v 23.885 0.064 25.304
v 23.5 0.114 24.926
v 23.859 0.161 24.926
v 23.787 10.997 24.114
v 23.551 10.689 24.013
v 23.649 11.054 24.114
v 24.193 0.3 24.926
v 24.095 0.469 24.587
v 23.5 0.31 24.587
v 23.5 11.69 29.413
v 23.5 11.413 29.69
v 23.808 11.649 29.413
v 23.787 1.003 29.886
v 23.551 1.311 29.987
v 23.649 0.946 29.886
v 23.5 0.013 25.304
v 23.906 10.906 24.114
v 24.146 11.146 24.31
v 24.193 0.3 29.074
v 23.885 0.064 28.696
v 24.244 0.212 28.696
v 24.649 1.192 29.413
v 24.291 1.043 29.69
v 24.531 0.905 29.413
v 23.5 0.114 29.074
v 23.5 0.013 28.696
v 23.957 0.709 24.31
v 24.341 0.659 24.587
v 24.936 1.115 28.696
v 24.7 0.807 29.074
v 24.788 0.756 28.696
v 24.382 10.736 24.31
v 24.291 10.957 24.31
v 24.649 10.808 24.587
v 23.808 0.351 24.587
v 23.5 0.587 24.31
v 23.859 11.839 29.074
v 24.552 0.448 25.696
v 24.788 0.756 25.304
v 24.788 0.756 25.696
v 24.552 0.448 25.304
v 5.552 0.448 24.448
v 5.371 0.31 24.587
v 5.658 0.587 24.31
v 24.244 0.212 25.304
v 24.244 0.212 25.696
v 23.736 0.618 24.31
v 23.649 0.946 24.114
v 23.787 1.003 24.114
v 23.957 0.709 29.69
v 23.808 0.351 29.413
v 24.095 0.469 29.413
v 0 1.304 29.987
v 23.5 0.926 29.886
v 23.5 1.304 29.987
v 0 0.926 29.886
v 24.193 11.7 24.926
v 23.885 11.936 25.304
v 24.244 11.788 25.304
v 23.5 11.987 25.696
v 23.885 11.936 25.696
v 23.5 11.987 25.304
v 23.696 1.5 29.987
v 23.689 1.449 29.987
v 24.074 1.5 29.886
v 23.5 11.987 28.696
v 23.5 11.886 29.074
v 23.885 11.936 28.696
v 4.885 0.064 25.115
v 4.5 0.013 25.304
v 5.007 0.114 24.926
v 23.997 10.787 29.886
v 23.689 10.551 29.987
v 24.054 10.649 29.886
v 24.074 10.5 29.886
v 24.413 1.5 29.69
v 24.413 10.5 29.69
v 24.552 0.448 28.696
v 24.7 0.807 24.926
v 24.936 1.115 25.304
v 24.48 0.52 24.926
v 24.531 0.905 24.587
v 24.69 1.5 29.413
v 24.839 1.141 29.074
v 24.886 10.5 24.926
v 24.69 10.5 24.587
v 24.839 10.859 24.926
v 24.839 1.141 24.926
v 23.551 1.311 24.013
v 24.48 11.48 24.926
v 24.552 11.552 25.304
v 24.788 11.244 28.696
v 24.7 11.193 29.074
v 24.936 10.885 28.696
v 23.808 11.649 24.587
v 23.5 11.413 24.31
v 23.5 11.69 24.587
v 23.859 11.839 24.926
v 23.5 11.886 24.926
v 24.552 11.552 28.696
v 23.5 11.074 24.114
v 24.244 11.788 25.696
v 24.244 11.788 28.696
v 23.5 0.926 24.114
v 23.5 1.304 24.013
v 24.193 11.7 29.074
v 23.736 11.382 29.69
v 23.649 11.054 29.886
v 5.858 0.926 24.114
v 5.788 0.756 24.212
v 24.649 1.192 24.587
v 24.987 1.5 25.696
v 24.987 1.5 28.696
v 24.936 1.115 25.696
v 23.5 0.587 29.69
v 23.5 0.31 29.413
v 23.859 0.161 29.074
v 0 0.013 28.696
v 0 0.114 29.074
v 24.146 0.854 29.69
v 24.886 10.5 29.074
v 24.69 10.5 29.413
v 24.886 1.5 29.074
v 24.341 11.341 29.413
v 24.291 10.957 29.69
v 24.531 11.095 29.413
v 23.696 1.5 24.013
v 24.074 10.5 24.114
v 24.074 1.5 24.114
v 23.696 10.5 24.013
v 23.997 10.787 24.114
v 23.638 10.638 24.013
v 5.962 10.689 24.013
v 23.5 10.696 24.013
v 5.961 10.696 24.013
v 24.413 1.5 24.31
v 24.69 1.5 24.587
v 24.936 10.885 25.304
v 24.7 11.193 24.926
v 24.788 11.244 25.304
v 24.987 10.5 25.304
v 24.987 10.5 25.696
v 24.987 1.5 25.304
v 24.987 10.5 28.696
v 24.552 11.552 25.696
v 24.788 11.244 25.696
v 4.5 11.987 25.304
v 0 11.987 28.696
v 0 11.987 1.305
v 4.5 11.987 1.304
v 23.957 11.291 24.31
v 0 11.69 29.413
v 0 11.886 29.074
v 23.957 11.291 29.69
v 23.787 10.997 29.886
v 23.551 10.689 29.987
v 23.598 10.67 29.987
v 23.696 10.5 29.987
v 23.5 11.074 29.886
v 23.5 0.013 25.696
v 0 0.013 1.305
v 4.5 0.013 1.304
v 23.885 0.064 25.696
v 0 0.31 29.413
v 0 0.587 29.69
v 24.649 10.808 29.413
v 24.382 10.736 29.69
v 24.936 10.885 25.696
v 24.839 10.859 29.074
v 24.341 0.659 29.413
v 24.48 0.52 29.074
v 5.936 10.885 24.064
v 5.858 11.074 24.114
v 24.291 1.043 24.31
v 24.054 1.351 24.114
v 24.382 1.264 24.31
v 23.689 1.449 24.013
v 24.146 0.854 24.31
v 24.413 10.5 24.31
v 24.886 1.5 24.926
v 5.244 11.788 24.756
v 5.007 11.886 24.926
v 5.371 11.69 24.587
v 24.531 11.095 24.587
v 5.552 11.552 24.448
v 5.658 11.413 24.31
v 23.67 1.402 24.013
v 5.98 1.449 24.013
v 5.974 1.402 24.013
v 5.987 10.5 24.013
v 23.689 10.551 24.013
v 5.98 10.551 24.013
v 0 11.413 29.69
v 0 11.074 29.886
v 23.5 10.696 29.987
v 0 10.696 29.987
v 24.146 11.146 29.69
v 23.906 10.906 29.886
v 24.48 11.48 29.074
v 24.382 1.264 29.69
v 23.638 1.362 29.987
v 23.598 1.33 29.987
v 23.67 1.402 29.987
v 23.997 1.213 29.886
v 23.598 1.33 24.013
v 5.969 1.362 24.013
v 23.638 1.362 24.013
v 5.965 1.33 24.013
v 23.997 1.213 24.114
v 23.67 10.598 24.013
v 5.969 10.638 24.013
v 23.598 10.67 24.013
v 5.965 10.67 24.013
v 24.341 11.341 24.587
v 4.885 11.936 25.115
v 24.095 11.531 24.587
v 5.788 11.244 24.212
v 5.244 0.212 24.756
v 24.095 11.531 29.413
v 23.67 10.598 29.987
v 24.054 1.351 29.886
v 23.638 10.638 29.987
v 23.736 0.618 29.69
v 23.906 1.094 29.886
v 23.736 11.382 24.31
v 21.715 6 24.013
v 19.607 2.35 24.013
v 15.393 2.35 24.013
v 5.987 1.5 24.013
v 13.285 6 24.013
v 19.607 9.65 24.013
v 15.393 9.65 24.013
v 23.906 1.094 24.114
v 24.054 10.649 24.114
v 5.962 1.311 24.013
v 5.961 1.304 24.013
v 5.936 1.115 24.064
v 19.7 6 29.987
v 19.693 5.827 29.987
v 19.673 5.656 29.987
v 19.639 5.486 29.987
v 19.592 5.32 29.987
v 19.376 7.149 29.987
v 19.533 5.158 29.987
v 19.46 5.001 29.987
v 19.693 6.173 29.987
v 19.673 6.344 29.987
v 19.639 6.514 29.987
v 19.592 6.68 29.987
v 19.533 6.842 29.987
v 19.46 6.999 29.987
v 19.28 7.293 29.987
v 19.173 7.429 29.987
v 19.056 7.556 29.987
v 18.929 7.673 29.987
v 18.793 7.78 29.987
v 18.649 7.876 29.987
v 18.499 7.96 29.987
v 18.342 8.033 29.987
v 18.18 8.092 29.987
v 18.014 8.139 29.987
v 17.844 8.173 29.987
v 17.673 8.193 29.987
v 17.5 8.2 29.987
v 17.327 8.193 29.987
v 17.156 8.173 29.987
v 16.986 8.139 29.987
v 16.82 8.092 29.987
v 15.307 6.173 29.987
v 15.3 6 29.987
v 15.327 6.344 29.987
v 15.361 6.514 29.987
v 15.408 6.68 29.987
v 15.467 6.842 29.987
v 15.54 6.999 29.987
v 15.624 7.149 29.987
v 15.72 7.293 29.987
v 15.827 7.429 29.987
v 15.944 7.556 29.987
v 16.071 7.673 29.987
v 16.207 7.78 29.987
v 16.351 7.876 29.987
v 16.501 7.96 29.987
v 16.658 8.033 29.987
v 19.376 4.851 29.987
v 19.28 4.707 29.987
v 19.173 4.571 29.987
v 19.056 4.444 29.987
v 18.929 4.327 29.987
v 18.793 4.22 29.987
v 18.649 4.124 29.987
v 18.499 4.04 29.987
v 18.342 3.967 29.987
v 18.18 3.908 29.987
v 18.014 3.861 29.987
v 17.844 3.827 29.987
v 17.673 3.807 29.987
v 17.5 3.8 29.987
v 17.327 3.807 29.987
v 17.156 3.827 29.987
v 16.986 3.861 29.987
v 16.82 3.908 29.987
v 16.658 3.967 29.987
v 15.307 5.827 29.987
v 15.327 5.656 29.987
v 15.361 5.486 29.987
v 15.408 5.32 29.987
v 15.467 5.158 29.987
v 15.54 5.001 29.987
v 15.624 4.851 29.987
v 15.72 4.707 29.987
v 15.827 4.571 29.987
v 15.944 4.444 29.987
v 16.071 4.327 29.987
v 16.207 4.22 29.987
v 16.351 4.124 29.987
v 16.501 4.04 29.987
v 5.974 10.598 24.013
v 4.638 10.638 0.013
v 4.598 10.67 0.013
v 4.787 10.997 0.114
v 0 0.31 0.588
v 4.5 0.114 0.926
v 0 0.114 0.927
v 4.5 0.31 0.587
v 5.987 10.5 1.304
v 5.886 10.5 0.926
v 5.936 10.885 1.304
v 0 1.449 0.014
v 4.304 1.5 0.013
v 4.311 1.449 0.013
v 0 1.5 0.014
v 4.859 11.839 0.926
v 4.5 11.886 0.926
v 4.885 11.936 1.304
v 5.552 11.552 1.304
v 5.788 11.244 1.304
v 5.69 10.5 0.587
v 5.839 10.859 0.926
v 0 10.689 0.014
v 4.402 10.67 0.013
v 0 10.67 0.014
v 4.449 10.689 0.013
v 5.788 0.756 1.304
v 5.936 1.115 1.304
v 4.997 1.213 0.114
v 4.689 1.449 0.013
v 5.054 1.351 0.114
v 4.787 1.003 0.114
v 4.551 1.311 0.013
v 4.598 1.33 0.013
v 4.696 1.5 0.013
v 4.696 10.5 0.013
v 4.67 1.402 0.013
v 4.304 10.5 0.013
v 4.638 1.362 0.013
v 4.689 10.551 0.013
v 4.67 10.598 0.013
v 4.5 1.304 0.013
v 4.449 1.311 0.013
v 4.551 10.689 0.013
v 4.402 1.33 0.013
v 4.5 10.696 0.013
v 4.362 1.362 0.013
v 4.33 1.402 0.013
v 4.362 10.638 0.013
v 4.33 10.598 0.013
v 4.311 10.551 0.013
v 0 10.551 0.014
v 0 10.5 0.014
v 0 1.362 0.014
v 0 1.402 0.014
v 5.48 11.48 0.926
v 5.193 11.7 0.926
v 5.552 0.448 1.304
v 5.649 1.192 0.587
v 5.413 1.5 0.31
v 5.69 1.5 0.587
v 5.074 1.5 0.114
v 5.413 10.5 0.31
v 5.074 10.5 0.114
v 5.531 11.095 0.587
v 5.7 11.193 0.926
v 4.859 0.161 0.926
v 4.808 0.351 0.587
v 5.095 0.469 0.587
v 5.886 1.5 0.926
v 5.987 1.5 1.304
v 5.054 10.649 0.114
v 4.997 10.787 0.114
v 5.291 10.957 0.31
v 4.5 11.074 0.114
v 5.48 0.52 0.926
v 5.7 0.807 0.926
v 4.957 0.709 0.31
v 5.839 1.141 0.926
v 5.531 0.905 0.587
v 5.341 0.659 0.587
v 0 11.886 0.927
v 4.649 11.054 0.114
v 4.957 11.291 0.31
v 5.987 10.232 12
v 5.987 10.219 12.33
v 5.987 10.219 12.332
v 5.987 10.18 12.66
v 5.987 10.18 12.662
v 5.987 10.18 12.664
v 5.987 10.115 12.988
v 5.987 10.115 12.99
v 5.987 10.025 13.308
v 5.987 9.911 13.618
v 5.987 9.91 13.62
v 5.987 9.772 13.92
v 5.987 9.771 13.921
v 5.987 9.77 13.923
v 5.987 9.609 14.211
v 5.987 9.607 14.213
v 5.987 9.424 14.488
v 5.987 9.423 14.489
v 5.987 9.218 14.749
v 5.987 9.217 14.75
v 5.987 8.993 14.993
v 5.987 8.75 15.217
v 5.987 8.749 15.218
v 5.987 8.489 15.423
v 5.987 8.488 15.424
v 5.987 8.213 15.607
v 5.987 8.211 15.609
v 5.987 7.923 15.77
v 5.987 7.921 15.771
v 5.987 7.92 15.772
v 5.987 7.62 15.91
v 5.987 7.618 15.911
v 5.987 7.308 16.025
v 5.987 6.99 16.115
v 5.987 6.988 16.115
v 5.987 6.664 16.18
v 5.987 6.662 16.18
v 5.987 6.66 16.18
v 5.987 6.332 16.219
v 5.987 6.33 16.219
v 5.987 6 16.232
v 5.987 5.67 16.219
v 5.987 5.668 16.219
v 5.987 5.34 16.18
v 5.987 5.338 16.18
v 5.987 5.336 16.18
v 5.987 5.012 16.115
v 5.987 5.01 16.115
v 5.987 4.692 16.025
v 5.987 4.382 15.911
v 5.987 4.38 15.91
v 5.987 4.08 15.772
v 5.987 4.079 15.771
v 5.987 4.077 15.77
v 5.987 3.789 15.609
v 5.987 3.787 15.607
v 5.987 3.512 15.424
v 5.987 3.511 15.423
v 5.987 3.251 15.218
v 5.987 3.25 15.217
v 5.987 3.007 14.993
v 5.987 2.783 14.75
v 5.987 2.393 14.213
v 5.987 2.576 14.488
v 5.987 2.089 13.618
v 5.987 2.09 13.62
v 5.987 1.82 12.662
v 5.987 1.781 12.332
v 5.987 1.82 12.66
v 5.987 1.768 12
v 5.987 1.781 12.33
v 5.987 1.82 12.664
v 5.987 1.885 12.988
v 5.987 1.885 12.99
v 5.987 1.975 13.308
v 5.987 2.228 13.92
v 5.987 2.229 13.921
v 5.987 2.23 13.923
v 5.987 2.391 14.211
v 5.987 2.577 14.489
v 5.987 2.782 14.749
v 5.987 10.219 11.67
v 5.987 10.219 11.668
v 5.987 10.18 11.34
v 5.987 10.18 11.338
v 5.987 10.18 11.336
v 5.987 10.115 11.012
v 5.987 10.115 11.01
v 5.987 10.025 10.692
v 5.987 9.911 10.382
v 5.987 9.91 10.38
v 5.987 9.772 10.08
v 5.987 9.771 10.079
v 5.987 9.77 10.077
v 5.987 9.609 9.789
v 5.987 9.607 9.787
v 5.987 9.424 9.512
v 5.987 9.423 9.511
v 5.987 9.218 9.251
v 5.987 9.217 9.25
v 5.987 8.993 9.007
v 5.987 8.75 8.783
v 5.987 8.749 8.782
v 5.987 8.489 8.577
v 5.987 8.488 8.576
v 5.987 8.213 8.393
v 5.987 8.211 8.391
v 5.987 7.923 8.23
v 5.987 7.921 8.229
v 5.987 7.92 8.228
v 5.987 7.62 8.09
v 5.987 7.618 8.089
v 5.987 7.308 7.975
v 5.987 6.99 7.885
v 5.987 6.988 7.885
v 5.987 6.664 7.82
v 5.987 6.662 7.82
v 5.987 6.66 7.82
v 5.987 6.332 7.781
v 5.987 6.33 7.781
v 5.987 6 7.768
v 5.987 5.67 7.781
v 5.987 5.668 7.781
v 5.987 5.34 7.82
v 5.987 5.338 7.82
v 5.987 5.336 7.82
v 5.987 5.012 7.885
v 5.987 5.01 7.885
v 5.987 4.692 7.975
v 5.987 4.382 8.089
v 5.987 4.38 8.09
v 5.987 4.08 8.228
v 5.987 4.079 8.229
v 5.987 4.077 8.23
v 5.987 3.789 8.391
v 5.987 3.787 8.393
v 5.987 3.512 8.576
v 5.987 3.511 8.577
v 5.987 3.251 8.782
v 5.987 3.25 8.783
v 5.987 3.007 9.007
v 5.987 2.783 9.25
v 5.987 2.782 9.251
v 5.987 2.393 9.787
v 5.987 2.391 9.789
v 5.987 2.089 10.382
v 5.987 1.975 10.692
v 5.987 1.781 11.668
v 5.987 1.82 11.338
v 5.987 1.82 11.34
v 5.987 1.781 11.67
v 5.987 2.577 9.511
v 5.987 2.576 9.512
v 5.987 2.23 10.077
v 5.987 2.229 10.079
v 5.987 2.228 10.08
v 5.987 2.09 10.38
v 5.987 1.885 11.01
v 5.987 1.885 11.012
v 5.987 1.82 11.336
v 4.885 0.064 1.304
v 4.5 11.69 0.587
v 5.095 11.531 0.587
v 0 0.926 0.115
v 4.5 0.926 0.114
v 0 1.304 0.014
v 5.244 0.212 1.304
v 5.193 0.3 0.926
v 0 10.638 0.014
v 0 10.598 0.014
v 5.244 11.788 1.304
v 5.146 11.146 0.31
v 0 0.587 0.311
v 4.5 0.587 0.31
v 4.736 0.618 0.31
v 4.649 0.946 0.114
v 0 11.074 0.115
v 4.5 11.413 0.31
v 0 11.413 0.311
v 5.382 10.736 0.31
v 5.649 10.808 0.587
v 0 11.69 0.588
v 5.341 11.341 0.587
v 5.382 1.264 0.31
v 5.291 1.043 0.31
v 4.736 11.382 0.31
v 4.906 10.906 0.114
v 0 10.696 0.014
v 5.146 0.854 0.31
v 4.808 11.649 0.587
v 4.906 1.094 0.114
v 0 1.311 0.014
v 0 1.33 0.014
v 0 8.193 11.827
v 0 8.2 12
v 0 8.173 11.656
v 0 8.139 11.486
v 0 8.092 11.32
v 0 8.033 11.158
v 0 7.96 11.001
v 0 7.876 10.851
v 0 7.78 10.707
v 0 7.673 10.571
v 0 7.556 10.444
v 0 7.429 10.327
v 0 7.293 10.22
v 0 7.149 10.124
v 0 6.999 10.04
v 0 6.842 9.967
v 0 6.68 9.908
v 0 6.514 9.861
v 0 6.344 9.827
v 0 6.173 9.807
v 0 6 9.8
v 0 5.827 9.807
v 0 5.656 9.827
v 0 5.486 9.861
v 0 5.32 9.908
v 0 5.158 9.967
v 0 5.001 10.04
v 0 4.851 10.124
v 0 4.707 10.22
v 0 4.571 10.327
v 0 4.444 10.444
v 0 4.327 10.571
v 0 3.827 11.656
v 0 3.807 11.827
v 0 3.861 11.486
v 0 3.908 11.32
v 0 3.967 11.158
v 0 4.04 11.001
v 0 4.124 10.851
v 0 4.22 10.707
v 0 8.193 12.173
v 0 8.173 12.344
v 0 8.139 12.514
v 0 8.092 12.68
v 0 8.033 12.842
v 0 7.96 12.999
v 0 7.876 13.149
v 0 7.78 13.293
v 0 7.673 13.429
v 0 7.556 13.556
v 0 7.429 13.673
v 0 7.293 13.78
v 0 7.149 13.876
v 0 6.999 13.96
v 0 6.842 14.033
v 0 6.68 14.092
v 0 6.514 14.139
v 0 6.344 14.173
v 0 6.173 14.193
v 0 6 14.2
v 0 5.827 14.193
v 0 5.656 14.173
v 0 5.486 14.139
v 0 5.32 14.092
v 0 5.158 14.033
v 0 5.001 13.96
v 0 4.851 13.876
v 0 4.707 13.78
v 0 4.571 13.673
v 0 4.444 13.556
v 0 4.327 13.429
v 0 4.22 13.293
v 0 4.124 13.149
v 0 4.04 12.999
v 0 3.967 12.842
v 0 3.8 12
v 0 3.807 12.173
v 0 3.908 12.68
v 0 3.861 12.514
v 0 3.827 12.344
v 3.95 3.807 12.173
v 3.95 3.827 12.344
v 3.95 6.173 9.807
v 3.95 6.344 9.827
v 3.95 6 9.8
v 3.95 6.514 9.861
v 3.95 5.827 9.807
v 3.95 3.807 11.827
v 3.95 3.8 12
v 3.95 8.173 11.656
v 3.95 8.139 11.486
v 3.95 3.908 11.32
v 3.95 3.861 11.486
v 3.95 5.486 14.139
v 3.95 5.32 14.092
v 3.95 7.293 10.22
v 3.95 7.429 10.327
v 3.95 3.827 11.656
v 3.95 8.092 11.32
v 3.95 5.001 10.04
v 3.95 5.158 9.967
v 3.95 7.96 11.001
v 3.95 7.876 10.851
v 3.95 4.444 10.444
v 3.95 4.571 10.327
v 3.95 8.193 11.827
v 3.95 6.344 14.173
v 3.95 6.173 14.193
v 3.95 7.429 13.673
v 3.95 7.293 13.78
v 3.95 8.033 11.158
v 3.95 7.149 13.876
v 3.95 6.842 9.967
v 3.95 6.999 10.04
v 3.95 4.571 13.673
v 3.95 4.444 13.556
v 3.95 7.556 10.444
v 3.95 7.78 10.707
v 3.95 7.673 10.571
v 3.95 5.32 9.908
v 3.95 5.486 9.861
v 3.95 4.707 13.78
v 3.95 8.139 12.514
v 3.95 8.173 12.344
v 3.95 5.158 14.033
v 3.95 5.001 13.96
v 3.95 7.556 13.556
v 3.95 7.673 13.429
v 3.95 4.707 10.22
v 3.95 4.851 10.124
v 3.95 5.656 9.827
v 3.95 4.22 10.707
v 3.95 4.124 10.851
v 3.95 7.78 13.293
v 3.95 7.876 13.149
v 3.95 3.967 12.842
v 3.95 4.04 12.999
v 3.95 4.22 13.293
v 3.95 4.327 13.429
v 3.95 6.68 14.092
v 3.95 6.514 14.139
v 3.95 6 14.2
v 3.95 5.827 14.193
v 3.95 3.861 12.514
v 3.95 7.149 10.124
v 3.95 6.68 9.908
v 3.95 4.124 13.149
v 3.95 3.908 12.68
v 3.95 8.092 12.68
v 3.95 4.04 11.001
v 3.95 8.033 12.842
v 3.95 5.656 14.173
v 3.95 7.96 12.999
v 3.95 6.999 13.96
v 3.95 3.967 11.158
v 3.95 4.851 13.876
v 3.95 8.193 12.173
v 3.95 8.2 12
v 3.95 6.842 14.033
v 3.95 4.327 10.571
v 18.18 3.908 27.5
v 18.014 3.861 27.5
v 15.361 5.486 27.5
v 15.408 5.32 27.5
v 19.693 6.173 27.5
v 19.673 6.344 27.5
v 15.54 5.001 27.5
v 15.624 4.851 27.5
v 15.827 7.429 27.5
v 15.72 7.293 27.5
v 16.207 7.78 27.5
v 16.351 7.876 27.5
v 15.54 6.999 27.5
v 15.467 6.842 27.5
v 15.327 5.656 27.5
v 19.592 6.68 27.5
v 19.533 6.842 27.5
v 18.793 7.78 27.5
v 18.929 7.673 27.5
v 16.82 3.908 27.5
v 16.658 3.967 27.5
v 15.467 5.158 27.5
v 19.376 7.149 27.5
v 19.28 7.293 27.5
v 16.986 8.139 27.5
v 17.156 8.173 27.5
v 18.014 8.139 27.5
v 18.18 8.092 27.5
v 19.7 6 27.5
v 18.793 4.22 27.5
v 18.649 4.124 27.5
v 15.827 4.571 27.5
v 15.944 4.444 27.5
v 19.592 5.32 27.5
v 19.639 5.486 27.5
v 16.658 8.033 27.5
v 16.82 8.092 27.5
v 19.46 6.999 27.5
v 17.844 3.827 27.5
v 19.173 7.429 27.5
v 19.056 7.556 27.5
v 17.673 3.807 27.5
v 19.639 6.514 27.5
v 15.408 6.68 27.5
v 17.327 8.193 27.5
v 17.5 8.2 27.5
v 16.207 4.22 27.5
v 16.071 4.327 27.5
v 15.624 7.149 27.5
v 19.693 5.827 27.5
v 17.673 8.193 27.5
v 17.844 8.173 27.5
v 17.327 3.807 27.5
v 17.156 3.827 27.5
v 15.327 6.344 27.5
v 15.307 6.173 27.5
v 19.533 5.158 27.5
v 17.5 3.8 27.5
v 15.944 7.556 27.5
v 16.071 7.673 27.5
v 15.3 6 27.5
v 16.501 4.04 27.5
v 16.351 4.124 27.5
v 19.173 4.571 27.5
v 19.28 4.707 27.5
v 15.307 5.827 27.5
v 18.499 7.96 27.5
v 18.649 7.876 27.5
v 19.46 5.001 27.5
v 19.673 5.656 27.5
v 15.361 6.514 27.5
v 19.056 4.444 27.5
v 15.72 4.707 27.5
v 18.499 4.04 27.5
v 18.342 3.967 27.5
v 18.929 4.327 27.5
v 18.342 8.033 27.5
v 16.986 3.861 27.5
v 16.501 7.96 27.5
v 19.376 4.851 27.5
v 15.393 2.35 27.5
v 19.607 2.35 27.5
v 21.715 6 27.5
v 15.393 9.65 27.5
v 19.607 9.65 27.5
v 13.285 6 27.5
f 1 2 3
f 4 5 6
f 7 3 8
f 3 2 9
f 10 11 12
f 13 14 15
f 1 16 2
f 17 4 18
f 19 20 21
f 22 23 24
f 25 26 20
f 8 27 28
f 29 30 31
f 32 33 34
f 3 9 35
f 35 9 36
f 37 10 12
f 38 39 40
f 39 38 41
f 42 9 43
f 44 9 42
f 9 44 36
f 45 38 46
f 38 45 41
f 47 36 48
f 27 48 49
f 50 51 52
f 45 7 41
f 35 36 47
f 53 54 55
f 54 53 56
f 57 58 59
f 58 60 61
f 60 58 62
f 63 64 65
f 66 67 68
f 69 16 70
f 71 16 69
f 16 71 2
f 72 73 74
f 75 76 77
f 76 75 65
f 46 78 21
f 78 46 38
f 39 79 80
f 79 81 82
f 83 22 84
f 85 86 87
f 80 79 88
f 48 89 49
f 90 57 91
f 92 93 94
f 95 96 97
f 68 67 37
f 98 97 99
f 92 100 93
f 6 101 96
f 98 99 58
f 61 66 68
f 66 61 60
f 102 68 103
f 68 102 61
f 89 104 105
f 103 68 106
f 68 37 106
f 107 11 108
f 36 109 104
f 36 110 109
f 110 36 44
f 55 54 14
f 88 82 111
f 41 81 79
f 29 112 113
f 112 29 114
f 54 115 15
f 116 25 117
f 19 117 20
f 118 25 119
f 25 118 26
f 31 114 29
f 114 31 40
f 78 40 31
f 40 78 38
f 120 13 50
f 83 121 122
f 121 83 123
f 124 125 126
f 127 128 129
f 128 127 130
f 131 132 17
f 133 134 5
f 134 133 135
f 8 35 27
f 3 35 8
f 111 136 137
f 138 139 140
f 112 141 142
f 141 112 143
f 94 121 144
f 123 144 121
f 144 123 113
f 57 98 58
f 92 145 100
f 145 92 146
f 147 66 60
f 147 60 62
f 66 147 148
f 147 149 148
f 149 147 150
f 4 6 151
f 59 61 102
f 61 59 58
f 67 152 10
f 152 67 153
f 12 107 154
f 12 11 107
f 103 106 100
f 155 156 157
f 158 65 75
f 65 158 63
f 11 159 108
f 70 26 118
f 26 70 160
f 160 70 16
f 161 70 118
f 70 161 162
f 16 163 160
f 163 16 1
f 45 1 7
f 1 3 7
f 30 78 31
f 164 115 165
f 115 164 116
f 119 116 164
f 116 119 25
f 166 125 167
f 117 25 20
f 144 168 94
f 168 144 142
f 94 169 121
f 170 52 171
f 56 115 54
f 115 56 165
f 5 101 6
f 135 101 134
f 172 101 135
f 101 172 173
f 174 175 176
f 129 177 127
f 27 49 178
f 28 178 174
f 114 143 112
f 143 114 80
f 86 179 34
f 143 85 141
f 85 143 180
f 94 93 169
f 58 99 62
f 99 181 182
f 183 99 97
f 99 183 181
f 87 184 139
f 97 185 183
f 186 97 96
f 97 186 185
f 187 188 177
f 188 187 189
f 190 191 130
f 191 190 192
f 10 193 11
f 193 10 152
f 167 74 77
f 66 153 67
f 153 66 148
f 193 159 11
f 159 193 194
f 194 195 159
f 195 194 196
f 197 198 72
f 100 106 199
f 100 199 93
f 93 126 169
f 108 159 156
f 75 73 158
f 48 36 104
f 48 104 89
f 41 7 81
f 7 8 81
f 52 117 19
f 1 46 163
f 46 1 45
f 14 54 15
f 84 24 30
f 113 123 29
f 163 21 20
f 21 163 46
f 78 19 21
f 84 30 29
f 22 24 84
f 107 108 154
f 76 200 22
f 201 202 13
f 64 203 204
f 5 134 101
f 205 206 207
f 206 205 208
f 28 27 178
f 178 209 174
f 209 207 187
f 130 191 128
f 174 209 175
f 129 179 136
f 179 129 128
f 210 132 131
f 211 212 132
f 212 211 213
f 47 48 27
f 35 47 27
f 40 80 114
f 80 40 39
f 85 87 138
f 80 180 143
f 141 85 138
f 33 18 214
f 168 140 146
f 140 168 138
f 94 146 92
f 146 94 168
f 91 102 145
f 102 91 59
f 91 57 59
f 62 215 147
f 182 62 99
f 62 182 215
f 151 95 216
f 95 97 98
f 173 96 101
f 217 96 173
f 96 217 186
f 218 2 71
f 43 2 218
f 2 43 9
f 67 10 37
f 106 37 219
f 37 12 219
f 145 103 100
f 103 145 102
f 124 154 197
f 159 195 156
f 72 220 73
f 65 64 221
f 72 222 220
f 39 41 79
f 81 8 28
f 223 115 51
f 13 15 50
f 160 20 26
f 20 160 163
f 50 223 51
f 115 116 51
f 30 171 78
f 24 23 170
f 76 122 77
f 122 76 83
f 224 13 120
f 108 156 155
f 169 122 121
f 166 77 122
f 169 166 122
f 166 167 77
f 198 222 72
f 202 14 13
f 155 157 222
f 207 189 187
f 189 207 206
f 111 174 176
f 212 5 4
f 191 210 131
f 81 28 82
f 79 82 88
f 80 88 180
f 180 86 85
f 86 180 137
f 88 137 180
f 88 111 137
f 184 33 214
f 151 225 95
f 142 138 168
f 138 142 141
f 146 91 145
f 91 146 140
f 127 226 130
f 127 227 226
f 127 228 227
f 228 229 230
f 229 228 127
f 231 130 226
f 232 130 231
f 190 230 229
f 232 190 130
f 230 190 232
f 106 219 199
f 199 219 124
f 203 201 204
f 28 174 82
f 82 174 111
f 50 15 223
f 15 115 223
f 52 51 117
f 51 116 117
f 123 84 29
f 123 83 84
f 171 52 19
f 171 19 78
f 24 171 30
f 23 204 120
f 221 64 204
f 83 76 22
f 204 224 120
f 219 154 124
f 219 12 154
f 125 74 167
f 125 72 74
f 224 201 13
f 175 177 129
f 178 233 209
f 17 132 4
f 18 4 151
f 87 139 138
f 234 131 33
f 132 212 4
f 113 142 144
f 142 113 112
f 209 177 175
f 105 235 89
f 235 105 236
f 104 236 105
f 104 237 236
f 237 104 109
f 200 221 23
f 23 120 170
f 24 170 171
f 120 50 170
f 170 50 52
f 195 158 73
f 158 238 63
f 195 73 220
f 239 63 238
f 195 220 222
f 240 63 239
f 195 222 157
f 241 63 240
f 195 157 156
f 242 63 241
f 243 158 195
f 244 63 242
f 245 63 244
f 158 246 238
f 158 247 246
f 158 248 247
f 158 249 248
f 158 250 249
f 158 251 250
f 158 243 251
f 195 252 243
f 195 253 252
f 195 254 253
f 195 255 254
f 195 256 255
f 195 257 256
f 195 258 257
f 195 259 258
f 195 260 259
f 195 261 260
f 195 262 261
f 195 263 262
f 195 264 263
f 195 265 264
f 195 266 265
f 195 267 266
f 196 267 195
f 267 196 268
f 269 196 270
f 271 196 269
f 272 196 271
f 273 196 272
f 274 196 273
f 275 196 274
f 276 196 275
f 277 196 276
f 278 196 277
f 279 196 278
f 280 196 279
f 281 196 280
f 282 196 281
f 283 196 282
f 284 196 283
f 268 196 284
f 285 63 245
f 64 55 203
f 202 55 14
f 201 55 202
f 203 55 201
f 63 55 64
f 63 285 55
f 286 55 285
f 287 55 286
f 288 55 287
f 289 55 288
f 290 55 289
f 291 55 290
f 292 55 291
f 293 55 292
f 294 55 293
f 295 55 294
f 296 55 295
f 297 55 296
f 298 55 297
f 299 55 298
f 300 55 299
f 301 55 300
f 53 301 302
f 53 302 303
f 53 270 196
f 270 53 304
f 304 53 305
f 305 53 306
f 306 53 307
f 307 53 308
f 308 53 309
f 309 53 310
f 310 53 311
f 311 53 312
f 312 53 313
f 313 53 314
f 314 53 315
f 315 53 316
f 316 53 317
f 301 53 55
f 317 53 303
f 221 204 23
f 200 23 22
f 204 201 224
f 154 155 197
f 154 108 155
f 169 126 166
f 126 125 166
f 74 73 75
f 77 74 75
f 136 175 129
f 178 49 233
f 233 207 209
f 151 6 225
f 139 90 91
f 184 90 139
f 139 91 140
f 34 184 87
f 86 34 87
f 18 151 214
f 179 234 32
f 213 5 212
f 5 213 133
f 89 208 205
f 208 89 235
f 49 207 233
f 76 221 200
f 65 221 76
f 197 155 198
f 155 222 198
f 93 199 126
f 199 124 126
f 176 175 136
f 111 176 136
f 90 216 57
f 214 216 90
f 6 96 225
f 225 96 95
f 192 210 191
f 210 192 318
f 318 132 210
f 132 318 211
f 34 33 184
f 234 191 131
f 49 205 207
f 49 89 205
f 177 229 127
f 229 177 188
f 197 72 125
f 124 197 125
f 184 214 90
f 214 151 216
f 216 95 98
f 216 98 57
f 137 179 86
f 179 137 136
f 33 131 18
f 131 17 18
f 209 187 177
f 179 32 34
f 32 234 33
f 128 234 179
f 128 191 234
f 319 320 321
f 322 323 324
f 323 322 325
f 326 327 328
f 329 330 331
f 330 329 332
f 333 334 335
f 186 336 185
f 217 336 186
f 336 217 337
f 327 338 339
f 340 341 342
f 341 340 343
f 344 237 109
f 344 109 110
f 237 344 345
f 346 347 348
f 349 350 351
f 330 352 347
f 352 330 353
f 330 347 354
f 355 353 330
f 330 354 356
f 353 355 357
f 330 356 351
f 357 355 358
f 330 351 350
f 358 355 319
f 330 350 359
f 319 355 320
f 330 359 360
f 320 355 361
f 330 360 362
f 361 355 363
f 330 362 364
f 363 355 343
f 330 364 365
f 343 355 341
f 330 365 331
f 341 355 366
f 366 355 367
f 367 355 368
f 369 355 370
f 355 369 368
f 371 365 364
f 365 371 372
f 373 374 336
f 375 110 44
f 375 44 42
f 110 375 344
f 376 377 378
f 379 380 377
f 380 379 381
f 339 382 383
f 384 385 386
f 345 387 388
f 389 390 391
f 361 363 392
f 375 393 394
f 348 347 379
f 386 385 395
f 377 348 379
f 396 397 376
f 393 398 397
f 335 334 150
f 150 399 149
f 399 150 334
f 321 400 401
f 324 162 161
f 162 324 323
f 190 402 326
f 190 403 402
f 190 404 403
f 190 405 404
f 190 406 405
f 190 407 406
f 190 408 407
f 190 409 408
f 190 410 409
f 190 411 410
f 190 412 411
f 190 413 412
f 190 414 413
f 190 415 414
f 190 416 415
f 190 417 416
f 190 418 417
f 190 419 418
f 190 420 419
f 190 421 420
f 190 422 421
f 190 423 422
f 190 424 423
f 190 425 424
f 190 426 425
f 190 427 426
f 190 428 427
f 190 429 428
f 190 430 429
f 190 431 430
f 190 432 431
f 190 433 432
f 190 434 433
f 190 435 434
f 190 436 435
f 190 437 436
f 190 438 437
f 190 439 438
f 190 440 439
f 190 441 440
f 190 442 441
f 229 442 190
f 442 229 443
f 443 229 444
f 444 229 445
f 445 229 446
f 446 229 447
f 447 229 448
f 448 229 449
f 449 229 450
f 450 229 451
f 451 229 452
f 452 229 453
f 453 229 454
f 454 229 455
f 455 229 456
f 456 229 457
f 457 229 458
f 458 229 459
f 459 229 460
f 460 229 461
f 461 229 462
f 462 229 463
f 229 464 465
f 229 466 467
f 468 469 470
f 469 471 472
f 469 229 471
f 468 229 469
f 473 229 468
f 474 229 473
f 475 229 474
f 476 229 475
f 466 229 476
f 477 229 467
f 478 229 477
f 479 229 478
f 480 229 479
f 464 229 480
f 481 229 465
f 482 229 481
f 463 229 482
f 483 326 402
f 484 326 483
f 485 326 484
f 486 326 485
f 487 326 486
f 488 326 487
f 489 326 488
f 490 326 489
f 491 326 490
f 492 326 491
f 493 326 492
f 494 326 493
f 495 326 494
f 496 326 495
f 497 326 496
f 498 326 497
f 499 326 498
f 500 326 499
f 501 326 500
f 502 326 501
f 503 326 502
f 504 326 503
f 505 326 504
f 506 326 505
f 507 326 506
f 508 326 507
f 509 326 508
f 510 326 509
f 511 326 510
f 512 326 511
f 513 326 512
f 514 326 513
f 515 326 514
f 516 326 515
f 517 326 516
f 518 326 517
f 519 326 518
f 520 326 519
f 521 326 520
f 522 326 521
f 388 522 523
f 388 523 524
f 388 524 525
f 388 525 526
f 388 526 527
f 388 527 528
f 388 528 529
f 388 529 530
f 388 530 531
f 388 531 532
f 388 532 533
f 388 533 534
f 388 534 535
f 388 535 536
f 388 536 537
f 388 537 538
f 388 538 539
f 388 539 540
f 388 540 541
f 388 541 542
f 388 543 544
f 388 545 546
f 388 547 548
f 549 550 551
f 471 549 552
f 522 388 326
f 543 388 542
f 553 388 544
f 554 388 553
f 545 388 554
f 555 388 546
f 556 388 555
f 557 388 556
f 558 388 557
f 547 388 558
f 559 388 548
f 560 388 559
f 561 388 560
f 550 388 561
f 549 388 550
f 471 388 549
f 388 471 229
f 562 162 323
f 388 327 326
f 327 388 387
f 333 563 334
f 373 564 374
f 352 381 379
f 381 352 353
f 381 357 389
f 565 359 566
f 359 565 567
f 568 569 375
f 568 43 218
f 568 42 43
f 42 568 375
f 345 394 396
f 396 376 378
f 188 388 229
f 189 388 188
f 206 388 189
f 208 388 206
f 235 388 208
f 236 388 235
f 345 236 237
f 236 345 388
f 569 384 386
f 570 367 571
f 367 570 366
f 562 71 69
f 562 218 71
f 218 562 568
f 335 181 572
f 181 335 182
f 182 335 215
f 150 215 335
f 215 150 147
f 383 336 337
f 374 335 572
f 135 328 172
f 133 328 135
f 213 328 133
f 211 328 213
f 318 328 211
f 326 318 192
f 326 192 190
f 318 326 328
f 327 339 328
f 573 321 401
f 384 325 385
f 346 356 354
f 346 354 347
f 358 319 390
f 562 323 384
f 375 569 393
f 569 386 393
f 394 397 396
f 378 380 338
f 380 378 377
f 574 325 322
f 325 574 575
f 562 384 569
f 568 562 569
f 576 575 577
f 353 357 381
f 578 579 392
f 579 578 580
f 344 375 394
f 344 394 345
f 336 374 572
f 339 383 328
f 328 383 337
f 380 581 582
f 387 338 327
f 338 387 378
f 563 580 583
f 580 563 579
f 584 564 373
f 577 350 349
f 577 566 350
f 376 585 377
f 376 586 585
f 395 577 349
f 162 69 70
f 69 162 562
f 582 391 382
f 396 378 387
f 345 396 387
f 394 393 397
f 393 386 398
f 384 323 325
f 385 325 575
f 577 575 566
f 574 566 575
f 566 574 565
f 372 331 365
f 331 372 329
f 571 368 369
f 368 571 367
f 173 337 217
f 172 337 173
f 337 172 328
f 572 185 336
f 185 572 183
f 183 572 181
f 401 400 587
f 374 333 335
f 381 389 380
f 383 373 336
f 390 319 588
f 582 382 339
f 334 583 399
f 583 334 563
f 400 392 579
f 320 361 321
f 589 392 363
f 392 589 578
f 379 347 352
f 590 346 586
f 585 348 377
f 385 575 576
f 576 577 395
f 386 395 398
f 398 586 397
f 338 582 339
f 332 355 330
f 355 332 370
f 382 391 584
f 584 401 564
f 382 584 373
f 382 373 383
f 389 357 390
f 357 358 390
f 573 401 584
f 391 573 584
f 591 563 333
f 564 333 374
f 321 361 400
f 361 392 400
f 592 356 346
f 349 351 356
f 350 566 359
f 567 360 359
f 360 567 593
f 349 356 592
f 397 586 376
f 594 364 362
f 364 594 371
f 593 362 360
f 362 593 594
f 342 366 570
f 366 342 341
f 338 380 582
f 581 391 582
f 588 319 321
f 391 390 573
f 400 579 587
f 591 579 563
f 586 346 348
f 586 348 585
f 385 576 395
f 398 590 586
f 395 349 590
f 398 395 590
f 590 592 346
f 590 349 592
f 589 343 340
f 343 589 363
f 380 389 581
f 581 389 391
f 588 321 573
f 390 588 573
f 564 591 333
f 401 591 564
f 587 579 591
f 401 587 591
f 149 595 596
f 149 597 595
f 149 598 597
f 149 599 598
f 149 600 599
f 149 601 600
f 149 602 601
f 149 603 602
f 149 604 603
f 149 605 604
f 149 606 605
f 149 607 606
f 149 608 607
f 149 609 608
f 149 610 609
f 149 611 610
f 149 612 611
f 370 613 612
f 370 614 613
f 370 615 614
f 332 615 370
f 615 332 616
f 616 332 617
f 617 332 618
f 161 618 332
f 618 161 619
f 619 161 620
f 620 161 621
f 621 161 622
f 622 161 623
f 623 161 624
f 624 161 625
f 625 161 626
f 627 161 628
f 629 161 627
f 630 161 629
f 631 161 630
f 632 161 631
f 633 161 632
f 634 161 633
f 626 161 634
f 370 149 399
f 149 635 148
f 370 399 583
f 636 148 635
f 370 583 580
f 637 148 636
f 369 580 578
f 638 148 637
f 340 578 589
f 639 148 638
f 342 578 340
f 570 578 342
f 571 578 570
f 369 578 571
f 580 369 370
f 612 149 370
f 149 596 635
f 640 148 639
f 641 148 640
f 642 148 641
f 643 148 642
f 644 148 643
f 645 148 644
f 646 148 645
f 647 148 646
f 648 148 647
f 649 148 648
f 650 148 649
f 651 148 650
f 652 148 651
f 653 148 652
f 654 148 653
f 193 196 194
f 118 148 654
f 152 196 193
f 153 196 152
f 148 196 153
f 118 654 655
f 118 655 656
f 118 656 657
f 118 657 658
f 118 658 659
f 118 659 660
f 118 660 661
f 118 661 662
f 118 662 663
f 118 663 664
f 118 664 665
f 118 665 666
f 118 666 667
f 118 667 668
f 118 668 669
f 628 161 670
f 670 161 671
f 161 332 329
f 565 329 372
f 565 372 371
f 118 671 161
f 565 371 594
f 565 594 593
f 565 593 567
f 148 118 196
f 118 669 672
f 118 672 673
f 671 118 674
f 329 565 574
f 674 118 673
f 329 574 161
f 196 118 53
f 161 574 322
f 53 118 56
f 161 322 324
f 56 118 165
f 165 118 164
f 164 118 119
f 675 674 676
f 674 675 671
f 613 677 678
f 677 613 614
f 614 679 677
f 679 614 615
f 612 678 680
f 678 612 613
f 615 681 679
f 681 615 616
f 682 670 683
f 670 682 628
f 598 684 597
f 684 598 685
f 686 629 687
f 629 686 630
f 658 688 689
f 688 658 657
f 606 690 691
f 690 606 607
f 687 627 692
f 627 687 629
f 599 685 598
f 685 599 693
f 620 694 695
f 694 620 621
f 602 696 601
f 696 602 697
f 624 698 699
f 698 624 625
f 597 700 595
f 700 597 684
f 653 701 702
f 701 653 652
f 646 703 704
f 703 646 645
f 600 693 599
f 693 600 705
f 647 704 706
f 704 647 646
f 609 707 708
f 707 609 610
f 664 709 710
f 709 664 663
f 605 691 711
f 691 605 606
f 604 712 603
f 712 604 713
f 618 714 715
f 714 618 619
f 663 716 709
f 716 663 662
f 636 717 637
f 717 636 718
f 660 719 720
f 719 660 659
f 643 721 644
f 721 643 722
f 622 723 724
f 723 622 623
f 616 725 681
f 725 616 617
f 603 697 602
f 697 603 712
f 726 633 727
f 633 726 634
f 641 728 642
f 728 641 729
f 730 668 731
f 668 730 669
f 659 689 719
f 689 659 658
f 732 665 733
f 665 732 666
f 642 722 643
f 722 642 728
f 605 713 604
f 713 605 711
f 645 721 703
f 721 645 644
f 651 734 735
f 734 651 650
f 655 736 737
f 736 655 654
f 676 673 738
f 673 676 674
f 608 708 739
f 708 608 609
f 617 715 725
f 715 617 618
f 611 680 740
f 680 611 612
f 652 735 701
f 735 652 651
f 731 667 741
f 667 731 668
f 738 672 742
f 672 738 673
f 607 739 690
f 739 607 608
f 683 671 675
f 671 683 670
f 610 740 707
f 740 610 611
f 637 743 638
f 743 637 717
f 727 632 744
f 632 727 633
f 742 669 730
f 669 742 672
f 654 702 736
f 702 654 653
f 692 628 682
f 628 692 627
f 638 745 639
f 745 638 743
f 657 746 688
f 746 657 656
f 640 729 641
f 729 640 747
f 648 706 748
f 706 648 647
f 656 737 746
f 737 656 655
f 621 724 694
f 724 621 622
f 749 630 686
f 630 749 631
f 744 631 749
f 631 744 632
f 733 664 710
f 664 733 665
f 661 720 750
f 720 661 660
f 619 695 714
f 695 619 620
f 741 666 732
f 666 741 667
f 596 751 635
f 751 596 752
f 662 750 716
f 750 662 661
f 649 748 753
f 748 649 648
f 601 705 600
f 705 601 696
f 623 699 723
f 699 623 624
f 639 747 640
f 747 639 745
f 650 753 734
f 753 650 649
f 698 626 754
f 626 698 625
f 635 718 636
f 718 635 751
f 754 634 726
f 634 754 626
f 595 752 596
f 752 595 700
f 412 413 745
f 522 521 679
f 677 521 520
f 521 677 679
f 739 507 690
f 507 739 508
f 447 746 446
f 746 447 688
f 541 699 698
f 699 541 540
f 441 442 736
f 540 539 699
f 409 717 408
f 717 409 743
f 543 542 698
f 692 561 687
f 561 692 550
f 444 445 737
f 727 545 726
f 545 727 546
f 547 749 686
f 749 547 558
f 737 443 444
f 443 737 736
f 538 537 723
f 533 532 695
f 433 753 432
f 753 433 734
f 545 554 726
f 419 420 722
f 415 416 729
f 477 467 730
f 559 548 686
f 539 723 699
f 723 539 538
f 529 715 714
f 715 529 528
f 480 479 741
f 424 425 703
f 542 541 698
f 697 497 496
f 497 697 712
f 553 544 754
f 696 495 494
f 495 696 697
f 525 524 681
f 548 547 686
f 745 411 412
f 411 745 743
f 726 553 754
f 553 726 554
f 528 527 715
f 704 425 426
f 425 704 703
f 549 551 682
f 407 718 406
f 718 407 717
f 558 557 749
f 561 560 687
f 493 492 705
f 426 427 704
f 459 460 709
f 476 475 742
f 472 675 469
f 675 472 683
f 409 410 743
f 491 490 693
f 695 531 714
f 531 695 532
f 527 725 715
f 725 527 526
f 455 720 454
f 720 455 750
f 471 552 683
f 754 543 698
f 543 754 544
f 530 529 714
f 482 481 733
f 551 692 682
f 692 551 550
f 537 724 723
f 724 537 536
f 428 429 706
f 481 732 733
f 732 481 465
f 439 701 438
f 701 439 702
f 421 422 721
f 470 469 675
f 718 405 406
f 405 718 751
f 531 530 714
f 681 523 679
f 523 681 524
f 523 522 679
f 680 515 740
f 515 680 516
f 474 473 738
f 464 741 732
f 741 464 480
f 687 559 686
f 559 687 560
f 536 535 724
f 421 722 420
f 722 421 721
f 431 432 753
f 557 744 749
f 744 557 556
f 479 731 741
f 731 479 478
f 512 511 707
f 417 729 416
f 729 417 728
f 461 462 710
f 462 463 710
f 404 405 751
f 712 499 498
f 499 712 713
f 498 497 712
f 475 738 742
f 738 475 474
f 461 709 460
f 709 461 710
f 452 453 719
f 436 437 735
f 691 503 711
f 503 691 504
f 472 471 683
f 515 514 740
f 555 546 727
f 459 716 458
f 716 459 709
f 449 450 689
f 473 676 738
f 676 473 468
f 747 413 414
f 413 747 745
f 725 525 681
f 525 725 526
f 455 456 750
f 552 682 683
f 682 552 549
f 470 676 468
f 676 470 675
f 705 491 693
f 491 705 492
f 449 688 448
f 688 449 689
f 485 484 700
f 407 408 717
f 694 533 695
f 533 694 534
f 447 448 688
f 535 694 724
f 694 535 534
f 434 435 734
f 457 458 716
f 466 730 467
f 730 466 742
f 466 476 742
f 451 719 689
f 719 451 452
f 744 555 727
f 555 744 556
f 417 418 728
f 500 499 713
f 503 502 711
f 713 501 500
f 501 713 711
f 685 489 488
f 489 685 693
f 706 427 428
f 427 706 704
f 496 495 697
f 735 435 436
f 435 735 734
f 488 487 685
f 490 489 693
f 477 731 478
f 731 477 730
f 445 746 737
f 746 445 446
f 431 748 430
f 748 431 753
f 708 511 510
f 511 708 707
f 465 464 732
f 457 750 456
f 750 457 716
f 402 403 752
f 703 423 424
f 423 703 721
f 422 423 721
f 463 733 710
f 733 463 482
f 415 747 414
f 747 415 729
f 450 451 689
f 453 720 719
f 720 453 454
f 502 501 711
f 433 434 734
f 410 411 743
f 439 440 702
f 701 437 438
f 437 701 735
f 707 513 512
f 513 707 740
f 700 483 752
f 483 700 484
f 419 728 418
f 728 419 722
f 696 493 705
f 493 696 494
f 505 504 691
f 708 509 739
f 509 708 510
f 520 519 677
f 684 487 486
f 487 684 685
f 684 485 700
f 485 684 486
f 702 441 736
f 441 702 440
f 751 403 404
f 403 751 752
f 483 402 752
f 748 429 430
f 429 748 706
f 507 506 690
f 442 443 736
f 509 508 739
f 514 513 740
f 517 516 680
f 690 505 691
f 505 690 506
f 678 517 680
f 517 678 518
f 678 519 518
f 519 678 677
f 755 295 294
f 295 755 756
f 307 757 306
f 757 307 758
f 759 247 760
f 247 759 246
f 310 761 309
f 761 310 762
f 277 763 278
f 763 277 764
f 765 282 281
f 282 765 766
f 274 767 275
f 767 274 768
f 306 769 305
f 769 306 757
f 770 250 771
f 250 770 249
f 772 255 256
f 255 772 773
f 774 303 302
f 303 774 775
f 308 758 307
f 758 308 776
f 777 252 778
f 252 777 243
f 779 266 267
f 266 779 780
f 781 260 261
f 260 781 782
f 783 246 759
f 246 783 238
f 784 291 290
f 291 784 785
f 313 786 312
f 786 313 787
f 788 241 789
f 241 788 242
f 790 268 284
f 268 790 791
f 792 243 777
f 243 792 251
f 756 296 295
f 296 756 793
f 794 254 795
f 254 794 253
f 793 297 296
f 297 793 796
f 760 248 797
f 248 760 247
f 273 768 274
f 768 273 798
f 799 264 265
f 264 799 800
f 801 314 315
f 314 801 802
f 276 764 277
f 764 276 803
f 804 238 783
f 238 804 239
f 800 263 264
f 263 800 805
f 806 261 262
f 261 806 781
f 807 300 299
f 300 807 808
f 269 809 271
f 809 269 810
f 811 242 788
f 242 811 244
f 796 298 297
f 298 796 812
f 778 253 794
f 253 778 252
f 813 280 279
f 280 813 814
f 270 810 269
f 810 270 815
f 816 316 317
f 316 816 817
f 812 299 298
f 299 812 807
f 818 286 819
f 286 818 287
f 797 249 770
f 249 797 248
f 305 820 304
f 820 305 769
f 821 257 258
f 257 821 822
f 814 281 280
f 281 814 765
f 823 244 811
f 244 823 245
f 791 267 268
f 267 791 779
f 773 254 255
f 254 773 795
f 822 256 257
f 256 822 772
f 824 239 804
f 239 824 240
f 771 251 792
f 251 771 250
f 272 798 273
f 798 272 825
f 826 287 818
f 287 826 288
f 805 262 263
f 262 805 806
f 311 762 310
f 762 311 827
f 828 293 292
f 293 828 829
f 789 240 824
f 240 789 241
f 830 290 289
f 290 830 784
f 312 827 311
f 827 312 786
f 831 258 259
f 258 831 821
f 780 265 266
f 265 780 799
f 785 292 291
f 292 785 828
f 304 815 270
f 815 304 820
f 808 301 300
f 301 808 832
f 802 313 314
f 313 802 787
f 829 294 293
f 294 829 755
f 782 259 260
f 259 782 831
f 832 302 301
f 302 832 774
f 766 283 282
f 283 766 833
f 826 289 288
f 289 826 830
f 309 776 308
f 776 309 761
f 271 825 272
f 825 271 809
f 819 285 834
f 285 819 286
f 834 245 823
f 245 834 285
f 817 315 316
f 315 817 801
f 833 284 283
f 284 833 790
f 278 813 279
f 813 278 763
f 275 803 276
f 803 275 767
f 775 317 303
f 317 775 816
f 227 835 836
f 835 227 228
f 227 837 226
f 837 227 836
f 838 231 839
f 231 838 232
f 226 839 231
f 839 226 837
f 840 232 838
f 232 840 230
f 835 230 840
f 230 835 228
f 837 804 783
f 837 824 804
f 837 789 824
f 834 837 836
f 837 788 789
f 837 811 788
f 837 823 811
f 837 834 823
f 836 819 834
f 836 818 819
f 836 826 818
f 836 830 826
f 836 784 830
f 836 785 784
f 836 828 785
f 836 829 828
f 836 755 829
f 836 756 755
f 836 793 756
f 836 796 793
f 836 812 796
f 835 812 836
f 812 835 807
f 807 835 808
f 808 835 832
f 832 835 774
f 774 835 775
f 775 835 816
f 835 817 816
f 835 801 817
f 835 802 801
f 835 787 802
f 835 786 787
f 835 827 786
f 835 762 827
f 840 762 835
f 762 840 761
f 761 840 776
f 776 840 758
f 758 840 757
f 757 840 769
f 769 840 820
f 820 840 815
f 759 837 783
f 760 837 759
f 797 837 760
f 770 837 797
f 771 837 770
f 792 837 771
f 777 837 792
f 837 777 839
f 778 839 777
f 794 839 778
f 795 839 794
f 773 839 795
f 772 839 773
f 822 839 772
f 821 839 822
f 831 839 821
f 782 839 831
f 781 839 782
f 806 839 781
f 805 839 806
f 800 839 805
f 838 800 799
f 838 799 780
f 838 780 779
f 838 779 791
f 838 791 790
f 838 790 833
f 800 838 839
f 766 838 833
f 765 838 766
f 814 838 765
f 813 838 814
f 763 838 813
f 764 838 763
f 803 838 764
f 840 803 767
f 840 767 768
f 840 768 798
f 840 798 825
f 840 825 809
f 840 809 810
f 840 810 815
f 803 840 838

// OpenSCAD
// Parametric L-shaped shelf mount.
// One countersunk screw into the wall, one screw up through the arm into the shelf.

screw_d    = 4;     // M-size of the screws (3, 4, 5 ...)
clearance  = 0.4;   // extra hole clearance
length     = 25;    // arm length (out from wall)
height     = 30;    // wall leg height
width      = 12;    // bracket width
thickness_min = 6;  // wall/arm thickness (grows if the nut needs more room)
radius     = 12;    // outer corner radius
end_radius = 0.001;     // radius on the free ends
edge_r     = 1.5;   // rounding of the edges facing away from wall/shelf
nut_clear  = 0.3;   // nut pocket clearance
$fn = 80;

hole_d = screw_d + clearance;
head_d = screw_d * 2 + 0.5;
head_h = (head_d - hole_d) / 2;      // 45 degree countersink
// ISO 4032 nut: across-flats and height per M size (fallback: approximations)
nut_af_tbl = [[2,4],[2.5,5],[3,5.5],[4,7],[5,8],[6,10],[8,13],[10,16]];
nut_h_tbl  = [[2,1.6],[2.5,2],[3,2.4],[4,3.2],[5,4.7],[6,5.2],[8,6.8],[10,8.4]];
function lookup_or(t, k, d) = len([for (e = t) if (e[0] == k) e[1]]) ? [for (e = t) if (e[0] == k) e[1]][0] : d;
nut_af = lookup_or(nut_af_tbl, screw_d, screw_d * 1.75) + nut_clear;
nut_h  = lookup_or(nut_h_tbl, screw_d, screw_d * 0.8) + nut_clear;
nut_d  = nut_af / cos(30);           // corner to corner
thickness = max(thickness_min, nut_h + 2.4);


module profile() {
    // x = out from wall, y = up. Wall at x=0, shelf rests on y=height.
    // Elbow stays square (it meets wall and shelf); everything else is rounded.
    inner_r = 3;
    difference() {
        hull_profile();
        translate([thickness, 0]) offset(r = inner_r) offset(delta = -inner_r)
            translate([0, -1]) square([length, height - thickness + 1]);
    }
}

module hull_profile() {
    union() {
        hull() {   // leg
            translate([-1, height - 1]) square(1);
            translate([-1, end_radius]) square([1, 1]);
            translate([thickness - end_radius, end_radius]) circle(r = end_radius);
            translate([thickness - 0.01, height - 0.01]) square(0.01);
        }
        hull() {   // arm
            translate([-1, height - 1]) square(1);
            translate([length - end_radius, height - end_radius]) circle(r = end_radius);
            translate([length - end_radius, height - thickness + end_radius]) circle(r = end_radius);
            translate([0, height - thickness]) square(0.01);
        }
    }
}

// Round every edge, then cut flat at the wall (x=0) and shelf (z=height) so those faces stay flat.
module body() {
    r = edge_r;
    intersection() {
        translate([0, 0, 0]) cube([length, width, height]);
        minkowski() {
            translate([0, width - r, 0]) rotate([90, 0, 0])
                linear_extrude(width - 2 * r)
                    offset(delta = -r) offset(delta = 0) 
                        translate([0, 0]) union() {
                            hull_profile();
                            translate([-r - 1, 0]) square([r + 1 + 0.01, height]) ;
                        }
            sphere(r = r, $fn = 24);
        }
    }
}

// Corner pieces extending the profile past wall/shelf so the cut faces are flat
difference() {
    body();

    // Wall screw (countersunk from the open face of the leg)
    translate([0, width / 2, (height - thickness) / 2]) rotate([0, 90, 0]) {
        translate([0, 0, -0.01]) cylinder(h = thickness + 0.02, d = hole_d);
        translate([0, 0, thickness - head_h]) cylinder(h = head_h + 0.01, d1 = hole_d, d2 = head_d + 0.01);
    }

    // Shelf bolt: from the shelf side down through the arm into a nut pocket in the underside
    translate([(thickness + length) / 2 + 2, width / 2, 0]) {
        translate([0, 0, height - thickness - 0.01]) cylinder(h = thickness + 0.02, d = hole_d);
        translate([0, 0, height - thickness - 0.01]) cylinder(h = nut_h + 0.01, d = nut_d, $fn = 6);
    }
}
